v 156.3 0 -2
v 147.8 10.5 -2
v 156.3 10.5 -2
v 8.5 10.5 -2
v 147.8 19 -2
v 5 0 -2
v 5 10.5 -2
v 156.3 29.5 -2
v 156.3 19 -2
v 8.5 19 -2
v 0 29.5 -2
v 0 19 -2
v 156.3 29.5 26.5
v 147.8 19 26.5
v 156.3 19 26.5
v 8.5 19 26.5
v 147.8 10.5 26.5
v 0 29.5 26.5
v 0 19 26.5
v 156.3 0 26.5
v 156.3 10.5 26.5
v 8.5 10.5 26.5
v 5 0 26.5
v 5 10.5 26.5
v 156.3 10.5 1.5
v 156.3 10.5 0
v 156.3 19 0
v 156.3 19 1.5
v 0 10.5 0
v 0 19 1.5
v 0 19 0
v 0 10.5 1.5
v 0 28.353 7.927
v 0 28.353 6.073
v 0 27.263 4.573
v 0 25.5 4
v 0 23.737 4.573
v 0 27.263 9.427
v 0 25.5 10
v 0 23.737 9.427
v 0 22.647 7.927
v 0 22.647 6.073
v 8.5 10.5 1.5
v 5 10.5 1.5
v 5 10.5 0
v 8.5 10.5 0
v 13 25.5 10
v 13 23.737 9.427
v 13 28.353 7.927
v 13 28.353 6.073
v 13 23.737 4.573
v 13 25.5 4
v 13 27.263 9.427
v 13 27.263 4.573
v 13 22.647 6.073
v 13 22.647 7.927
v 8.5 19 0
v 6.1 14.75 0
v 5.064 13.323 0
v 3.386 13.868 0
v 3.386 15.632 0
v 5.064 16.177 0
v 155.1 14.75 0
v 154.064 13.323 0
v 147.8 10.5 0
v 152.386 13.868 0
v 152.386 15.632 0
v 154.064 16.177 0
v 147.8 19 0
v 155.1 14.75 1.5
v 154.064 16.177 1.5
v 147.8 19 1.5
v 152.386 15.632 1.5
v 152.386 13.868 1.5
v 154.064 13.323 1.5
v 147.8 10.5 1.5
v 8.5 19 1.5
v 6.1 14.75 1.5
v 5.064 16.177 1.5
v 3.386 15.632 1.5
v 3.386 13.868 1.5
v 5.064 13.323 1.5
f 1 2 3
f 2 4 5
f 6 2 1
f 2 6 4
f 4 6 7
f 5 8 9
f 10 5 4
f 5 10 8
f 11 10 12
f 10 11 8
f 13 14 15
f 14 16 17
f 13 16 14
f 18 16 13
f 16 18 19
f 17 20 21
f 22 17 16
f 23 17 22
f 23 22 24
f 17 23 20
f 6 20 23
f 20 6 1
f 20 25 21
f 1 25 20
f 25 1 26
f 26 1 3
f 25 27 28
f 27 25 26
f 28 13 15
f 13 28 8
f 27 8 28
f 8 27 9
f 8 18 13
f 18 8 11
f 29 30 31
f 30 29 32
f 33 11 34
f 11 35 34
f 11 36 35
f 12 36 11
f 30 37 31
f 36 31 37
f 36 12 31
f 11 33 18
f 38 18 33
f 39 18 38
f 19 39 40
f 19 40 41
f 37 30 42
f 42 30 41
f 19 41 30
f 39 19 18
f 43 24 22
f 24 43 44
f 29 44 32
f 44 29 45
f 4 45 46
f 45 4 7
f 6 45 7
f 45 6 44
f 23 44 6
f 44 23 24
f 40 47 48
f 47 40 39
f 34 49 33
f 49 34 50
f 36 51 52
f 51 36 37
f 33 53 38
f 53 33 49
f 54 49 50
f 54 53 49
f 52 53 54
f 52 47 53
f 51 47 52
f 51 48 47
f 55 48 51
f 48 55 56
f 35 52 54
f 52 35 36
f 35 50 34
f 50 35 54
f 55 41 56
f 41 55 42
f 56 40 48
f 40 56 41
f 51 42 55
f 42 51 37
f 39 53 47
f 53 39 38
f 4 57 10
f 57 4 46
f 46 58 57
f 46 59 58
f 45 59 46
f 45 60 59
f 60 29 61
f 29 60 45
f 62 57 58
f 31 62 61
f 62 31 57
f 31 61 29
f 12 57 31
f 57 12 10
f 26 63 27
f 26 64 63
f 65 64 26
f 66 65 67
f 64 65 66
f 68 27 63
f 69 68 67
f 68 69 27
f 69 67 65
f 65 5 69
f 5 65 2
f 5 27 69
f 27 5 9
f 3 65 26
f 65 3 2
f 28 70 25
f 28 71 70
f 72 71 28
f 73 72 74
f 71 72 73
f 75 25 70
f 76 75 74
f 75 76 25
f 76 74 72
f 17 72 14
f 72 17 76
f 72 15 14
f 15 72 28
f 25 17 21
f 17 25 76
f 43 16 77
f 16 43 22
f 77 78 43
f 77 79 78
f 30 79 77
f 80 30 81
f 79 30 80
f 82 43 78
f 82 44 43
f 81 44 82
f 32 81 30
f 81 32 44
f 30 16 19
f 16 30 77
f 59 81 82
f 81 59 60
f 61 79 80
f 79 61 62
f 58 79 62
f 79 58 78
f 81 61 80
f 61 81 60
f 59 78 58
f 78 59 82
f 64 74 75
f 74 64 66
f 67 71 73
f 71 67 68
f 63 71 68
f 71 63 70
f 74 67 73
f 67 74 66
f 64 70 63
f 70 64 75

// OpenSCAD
module power_board(){   
   module board(){
        translate([0, 0, -2]) linear_extrude(28.5) difference(){
            square([156.3, 29.5]);
            square([5, 10.5]);
        }
    }


    difference(){
        board();
       
        translate([0, 25.5, 7]) rotate([0, 90]) cylinder(13, 3, 3);
        
        translate([0, 29.5 / 2 - 8.5 / 2, -2]) cube([8.5, 8.5, 2]);
        translate([147.8, 29.5 / 2 - 8.5 / 2, -2]) cube([8.5, 8.5, 2]);
        translate([147.8, 29.5 / 2 - 8.5 / 2, 1.5]) cube([8.5, 8.5, 30]);
        translate([0, 29.5 / 2 - 8.5 / 2, 1.5]) cube([8.5, 8.5, 30]);
        
        translate([4.6, 29.5/2]) cylinder(1.5, 1.5, 1.5);
        translate([143 + 6 + 4.6, 29.5/2]) cylinder(1.5, 1.5, 1.5);
    }
}

power_board();
